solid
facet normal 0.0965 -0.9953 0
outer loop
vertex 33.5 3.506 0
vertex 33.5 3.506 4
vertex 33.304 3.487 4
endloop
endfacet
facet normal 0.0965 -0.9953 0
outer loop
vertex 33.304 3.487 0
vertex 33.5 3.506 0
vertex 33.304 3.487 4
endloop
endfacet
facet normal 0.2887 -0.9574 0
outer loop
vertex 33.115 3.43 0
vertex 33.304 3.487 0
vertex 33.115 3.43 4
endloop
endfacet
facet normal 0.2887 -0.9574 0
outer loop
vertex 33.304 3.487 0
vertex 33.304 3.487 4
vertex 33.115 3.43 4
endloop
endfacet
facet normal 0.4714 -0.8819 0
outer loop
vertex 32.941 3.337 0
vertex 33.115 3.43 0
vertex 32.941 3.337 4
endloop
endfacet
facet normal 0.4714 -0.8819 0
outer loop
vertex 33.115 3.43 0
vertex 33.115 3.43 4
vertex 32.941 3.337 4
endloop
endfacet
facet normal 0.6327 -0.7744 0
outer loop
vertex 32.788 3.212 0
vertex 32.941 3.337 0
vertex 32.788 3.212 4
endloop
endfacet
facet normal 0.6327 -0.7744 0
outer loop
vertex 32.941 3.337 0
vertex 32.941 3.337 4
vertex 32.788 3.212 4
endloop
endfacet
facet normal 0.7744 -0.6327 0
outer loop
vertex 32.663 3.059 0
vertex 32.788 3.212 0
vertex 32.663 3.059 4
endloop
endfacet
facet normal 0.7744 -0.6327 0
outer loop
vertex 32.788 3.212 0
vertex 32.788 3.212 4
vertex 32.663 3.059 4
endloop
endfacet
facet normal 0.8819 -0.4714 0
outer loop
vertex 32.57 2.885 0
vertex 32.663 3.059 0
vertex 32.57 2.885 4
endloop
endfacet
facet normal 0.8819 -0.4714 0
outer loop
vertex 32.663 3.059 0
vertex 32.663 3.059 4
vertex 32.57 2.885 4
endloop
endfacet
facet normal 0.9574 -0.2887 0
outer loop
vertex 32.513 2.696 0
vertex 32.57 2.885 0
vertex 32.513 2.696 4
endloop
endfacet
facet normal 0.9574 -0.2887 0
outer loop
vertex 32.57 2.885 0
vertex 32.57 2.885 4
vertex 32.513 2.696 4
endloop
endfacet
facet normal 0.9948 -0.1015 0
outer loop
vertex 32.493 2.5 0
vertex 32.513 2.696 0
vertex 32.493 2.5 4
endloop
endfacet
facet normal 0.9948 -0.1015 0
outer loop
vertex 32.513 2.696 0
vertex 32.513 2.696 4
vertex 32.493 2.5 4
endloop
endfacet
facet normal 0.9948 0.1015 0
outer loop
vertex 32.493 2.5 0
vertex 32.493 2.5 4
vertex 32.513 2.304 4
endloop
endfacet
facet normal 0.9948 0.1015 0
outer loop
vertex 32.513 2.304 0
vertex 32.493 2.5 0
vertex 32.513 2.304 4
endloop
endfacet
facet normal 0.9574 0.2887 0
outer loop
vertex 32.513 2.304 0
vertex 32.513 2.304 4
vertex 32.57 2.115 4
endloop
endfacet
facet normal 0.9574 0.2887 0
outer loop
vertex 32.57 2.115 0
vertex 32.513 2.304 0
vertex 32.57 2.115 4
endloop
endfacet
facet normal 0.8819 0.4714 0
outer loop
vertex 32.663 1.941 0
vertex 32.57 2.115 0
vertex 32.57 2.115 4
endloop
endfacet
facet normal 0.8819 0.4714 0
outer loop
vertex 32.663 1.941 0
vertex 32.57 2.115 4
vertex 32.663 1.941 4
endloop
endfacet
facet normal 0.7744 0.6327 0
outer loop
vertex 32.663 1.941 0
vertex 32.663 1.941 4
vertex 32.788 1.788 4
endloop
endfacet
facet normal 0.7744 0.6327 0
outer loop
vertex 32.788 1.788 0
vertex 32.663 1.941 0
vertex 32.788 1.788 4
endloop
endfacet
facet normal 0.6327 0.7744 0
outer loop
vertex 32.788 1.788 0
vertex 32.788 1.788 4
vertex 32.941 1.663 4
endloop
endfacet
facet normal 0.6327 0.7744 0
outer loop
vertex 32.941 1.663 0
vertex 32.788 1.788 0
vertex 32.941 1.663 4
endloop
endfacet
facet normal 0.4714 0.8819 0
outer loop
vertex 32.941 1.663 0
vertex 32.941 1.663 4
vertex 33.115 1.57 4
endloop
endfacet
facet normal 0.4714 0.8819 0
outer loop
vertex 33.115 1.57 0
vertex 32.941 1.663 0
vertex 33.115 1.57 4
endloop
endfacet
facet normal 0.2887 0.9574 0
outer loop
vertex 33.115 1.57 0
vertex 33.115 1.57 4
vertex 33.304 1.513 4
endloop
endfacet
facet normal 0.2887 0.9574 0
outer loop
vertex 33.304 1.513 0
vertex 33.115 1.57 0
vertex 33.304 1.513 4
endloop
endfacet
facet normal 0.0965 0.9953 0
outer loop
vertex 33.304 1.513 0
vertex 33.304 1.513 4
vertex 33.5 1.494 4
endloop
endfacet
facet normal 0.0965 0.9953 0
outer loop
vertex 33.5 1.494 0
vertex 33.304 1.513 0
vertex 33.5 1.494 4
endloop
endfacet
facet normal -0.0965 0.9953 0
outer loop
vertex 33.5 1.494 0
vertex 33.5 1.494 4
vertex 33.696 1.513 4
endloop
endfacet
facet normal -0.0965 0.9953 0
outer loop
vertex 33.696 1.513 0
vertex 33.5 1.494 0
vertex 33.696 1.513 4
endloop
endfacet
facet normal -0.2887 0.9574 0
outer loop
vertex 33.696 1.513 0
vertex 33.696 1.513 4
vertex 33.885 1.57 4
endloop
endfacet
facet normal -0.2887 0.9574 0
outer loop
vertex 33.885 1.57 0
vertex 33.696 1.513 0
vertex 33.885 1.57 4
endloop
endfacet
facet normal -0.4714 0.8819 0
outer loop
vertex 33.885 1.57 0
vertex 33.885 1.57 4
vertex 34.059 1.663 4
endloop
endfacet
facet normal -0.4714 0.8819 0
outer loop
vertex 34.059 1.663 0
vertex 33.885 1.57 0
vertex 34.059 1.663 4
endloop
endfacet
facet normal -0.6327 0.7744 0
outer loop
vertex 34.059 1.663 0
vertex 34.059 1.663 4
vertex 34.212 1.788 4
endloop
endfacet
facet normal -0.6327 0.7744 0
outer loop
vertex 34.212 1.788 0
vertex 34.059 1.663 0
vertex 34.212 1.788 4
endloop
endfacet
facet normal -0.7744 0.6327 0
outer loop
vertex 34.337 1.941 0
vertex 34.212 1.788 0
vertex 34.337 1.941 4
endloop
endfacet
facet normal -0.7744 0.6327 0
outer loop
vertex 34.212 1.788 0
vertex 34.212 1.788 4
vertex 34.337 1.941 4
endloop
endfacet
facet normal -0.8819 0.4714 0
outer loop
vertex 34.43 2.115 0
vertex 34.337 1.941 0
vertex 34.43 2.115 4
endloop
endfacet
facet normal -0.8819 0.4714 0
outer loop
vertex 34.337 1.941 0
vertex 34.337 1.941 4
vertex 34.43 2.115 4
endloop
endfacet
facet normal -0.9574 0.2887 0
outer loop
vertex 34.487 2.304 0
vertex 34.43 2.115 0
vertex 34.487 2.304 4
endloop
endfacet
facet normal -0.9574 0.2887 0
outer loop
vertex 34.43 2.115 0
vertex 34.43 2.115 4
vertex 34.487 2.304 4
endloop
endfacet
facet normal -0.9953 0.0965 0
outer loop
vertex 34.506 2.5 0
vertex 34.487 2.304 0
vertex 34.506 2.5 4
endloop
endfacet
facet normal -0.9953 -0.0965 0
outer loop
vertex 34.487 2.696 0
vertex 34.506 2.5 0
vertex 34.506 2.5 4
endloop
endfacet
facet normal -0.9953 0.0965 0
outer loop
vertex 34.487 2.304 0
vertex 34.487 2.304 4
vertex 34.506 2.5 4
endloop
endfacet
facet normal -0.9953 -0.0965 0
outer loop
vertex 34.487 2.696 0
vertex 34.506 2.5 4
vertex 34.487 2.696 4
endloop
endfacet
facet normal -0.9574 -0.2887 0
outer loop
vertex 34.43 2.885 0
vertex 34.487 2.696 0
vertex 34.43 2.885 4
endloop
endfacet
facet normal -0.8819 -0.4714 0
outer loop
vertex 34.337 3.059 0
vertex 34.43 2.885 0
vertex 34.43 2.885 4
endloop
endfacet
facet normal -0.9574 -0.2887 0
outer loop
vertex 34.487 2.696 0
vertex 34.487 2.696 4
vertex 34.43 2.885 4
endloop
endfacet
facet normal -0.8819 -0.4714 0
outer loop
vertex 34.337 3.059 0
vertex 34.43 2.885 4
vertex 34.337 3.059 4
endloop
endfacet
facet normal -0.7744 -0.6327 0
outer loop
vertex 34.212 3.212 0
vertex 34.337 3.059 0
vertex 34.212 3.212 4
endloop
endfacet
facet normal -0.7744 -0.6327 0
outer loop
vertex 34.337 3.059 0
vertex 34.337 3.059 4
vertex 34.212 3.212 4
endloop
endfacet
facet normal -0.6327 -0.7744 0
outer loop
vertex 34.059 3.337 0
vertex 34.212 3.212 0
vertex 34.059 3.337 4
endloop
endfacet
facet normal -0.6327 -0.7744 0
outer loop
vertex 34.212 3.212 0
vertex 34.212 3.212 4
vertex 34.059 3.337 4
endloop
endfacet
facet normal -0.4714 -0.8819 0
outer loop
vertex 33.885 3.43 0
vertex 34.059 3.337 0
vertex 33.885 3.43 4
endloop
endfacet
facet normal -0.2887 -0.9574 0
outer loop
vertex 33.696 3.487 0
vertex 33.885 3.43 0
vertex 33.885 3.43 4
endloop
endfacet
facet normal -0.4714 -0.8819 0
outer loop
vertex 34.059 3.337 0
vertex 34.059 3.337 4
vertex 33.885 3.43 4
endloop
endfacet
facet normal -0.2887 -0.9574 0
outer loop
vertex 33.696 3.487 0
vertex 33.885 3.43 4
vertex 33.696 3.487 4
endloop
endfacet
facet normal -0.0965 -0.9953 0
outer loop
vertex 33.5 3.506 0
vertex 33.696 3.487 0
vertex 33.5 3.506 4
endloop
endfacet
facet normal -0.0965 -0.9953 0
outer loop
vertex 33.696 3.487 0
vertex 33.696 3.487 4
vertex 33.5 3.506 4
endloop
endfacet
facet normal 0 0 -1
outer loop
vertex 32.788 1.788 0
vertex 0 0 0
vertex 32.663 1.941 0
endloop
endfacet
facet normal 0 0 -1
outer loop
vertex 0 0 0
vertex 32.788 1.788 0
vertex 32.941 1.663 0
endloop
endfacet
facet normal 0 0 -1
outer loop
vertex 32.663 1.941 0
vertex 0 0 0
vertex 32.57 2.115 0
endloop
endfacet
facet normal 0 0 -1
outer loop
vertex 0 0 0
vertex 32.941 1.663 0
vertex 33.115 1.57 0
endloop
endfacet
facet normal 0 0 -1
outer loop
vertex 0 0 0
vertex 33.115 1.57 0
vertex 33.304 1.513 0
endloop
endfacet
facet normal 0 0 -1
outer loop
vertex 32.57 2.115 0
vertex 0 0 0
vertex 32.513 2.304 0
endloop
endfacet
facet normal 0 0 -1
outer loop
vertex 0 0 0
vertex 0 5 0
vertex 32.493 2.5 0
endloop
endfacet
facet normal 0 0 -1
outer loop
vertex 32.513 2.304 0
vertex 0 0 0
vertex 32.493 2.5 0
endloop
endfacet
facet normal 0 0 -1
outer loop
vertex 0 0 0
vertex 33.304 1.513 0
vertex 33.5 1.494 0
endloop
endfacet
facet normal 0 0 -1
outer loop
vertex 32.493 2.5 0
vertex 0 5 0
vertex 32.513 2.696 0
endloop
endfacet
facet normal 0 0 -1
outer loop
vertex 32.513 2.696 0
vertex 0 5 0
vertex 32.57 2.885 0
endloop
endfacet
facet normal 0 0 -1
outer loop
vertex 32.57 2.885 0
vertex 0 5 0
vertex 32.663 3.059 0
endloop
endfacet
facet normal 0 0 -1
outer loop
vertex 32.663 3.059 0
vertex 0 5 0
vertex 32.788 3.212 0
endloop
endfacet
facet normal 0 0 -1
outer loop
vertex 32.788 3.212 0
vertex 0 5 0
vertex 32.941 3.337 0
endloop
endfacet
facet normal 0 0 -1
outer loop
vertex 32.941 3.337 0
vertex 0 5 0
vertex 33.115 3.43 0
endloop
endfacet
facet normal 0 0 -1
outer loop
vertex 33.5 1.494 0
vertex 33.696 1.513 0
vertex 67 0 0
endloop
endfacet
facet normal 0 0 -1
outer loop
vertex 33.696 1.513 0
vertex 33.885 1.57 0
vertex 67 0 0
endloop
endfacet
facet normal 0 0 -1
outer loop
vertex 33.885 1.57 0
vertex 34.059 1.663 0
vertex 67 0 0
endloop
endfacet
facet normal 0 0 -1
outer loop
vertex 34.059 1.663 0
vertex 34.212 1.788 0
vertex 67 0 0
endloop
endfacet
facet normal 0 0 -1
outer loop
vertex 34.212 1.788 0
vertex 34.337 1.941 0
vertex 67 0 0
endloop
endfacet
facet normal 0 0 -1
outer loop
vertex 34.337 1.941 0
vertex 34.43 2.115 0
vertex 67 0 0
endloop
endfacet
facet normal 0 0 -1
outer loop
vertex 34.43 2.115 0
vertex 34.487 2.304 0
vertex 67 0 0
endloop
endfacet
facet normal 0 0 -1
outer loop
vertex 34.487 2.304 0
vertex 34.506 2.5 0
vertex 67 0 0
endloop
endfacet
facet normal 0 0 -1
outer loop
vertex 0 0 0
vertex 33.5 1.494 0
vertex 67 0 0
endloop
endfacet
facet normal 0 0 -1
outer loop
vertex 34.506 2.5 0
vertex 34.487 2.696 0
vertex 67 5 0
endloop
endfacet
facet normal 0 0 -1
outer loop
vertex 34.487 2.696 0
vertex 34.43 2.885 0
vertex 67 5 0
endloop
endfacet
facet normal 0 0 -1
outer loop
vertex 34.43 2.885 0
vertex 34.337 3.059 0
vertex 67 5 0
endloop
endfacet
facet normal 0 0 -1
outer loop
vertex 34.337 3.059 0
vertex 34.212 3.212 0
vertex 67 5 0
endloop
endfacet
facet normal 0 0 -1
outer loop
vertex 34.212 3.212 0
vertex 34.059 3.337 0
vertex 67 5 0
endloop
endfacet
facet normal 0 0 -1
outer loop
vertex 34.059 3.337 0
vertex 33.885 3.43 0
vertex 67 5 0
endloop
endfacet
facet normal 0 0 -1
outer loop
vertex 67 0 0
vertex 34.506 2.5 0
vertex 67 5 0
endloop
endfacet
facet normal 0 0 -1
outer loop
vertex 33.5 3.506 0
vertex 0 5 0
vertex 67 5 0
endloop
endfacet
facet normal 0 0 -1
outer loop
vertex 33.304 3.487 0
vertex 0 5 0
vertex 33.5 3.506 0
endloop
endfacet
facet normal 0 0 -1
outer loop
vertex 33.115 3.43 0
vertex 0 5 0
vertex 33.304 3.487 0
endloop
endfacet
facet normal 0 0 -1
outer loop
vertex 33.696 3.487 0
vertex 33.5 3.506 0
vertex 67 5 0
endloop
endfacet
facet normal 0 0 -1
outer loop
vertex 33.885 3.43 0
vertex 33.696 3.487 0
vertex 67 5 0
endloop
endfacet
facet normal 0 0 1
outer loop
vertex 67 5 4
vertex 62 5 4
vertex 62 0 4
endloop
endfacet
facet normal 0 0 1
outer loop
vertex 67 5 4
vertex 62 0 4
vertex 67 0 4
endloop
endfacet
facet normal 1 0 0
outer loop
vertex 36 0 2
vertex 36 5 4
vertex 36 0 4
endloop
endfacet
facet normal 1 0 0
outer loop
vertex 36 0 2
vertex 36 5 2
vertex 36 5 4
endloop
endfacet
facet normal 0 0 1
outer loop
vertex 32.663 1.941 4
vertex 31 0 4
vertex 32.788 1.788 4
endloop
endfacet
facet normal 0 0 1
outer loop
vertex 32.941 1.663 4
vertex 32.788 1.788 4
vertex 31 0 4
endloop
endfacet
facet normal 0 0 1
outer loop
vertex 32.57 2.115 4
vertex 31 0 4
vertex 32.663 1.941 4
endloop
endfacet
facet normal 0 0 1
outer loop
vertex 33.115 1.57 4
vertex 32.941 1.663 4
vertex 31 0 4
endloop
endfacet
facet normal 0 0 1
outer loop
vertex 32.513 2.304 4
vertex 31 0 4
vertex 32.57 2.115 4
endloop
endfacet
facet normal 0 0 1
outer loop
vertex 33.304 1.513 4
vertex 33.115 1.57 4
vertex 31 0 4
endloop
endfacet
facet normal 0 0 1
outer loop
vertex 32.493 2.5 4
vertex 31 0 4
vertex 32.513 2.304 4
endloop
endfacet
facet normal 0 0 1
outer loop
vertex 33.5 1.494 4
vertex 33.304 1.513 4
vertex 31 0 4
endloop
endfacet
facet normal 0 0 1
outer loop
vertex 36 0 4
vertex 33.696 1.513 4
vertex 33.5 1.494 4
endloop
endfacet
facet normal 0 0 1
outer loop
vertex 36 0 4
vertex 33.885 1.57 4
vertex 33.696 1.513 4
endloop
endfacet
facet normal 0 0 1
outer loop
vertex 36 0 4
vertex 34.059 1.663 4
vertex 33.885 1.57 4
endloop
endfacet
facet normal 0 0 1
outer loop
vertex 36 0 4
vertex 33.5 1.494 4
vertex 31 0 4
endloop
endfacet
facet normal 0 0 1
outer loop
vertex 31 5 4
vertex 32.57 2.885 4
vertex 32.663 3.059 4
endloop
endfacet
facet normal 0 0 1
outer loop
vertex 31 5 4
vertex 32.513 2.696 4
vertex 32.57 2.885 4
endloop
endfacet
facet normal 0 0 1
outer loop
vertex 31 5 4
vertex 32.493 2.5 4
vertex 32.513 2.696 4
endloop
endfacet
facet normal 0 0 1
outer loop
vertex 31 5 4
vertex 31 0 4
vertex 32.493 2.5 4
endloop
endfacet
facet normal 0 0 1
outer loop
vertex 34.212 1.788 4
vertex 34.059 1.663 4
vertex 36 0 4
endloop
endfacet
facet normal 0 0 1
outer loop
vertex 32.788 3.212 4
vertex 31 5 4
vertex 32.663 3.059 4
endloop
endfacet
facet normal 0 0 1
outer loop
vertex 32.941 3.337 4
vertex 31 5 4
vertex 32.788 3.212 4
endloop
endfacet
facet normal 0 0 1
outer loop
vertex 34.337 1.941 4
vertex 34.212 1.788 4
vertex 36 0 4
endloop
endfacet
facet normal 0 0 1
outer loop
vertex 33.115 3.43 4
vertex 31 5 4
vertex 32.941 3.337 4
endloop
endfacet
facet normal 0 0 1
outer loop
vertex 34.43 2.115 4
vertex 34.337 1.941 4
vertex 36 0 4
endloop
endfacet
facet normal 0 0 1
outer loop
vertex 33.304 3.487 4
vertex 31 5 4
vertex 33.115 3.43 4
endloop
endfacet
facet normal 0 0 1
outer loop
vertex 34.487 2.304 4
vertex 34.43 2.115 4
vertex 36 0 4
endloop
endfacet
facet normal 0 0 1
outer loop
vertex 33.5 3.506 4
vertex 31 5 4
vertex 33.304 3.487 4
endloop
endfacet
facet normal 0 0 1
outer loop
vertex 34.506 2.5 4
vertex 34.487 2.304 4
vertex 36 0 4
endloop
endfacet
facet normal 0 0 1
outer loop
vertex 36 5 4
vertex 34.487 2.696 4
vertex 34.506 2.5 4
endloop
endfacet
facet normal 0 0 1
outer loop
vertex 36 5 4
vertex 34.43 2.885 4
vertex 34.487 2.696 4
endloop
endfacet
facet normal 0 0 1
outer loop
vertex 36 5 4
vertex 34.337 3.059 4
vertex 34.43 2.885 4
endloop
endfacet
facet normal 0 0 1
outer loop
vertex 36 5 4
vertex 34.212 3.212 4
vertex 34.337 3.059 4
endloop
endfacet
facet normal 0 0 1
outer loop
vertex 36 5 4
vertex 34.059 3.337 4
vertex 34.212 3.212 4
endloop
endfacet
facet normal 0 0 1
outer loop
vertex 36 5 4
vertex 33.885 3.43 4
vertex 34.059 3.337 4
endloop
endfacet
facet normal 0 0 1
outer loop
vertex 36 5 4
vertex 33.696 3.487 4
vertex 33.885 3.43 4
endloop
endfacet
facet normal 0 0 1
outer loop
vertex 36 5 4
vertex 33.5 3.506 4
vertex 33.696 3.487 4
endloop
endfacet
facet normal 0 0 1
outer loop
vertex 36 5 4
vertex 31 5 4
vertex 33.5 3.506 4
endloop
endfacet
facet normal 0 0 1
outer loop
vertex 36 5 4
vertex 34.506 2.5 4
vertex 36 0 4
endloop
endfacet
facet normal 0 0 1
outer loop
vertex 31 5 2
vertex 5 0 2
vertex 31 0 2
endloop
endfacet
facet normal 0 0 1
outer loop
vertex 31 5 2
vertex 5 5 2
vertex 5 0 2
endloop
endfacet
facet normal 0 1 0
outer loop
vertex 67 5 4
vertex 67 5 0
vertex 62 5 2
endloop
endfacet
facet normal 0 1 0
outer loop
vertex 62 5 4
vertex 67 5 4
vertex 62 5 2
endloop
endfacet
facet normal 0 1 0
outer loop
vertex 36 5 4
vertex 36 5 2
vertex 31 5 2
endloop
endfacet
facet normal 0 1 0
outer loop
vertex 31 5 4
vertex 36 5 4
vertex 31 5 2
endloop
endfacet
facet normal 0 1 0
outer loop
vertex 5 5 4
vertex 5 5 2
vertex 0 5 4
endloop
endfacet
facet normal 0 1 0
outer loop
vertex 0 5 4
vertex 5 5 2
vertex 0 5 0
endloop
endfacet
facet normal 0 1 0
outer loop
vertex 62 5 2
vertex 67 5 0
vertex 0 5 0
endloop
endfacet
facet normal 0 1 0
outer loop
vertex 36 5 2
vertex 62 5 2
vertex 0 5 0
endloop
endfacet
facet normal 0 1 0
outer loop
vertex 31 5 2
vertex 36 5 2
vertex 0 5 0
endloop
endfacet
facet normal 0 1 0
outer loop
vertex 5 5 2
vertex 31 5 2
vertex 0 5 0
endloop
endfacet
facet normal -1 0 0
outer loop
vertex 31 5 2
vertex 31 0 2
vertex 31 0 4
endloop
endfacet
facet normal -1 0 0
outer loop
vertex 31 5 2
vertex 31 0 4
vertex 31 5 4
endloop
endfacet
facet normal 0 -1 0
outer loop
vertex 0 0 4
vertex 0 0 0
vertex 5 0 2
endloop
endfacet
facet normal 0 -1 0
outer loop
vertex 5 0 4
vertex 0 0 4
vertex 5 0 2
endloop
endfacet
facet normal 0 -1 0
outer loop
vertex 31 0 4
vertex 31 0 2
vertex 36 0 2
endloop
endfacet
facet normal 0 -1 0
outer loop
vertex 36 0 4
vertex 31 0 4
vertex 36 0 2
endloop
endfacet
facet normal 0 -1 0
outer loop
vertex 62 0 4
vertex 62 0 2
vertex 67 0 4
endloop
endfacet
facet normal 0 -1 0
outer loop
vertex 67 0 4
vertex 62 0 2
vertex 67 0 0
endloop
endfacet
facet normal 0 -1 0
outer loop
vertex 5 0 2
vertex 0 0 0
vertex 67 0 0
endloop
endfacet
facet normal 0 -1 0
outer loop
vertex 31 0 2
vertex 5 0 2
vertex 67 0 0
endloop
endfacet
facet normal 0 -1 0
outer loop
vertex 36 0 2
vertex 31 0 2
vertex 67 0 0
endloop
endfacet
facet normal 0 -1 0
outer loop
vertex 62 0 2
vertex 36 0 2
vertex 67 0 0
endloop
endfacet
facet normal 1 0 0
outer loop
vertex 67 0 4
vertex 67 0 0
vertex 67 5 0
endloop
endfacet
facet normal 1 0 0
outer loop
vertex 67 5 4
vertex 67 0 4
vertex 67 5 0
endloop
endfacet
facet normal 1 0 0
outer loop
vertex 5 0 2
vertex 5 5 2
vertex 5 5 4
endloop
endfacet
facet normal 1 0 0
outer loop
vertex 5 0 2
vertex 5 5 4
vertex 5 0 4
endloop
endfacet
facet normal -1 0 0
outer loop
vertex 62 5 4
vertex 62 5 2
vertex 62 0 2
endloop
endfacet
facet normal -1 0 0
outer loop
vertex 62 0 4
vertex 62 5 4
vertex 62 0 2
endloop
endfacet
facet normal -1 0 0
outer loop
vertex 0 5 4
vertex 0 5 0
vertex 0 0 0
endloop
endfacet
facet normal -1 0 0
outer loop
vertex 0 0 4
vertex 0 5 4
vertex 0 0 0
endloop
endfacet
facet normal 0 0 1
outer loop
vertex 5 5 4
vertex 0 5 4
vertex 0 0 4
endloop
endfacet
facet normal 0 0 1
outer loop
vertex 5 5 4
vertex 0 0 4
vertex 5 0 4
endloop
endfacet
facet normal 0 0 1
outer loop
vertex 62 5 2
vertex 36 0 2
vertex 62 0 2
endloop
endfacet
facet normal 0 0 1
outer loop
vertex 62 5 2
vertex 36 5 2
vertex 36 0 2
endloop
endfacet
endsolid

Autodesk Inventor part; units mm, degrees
ref_plane "YZ Plane" through (0, 0, 0) normal (1, 0, 0) x (0, 1, 0)
ref_plane "XZ Plane" through (0, 0, 0) normal (0, 1, 0) x (-1, 0, 0)
ref_plane "XY Plane" through (0, 0, 0) normal (0, 0, 1) x (1, 0, 0)
sketch "Sketch1" plane through (0, 0, 0) normal (0, 0, 1) x (1, 0, 0)
  line L0 (0, 0) -> (67, 0)
  line L1 (67, 0) -> (67, 5)
  line L2 (67, 5) -> (0, 5)
  line L3 (0, 5) -> (0, 0)
  dimension "d0" = 5
  dimension "d1" = 67
extrude "Extrusion1" add sketch "Sketch1" along normal blind 2
sketch "Sketch2" plane through (0, 0, 2) normal (0, 0, 1) x (1, 0, 0)
  line L0 (0, 0) -> (67, 0) projected
  line L1 (67, 0) -> (67, 5) projected
  line L2 (67, 5) -> (0, 5) projected
  line L3 (0, 5) -> (0, 0) projected
  line L4 (0, 5) -> (5, 5)
  line L5 (5, 5) -> (5, 0)
  line L6 (5, 0) -> (0, 0)
  line L7 (0, 0) -> (0, 5)
  line L8 (31, 5) -> (36, 5)
  line L9 (36, 5) -> (36, 0)
  line L10 (36, 0) -> (31, 0)
  line L11 (31, 0) -> (31, 5)
  line L12 (67, 5) -> (62, 5)
  line L13 (62, 5) -> (62, 0)
  line L14 (62, 0) -> (67, 0)
  line L15 (67, 0) -> (67, 5)
  dimension "d4" = 5
  dimension "d5" = 5
  dimension "d7" = 26
  dimension "d8" = 26
extrude "Extrusion2" add sketch "Sketch2" along normal blind 2 contours L3 L2 L5 L0 | L11 L2 L9 L0 | L13 L2 L1 L0
sketch "Sketch4" plane through (0, 0, 0) normal (0, 0, -1) x (-1, 0, 0)
  line L0 (0, 0) -> (-67, 0) projected
  line L1 (0, 5) -> (0, 0) projected
  line L2 (-67, 5) -> (0, 5) projected
  line L3 (-67, 0) -> (-67, 5) projected
  line L4 (-67, 2.5) -> (0, 2.5) construction
  line L5 (-33.5, 5) -> (-33.5, 0) construction
  point P0 (-33.5, 2.5)
hole "Hole1" at (33.5, 2.5, 0) direction (0, 0, 1) diameter 2.013 end through all thread size "M2.5x0.45" class "6H" standard "ISO Metric profile"
properties part number "top_conductor" material "Copper, Alloy"
